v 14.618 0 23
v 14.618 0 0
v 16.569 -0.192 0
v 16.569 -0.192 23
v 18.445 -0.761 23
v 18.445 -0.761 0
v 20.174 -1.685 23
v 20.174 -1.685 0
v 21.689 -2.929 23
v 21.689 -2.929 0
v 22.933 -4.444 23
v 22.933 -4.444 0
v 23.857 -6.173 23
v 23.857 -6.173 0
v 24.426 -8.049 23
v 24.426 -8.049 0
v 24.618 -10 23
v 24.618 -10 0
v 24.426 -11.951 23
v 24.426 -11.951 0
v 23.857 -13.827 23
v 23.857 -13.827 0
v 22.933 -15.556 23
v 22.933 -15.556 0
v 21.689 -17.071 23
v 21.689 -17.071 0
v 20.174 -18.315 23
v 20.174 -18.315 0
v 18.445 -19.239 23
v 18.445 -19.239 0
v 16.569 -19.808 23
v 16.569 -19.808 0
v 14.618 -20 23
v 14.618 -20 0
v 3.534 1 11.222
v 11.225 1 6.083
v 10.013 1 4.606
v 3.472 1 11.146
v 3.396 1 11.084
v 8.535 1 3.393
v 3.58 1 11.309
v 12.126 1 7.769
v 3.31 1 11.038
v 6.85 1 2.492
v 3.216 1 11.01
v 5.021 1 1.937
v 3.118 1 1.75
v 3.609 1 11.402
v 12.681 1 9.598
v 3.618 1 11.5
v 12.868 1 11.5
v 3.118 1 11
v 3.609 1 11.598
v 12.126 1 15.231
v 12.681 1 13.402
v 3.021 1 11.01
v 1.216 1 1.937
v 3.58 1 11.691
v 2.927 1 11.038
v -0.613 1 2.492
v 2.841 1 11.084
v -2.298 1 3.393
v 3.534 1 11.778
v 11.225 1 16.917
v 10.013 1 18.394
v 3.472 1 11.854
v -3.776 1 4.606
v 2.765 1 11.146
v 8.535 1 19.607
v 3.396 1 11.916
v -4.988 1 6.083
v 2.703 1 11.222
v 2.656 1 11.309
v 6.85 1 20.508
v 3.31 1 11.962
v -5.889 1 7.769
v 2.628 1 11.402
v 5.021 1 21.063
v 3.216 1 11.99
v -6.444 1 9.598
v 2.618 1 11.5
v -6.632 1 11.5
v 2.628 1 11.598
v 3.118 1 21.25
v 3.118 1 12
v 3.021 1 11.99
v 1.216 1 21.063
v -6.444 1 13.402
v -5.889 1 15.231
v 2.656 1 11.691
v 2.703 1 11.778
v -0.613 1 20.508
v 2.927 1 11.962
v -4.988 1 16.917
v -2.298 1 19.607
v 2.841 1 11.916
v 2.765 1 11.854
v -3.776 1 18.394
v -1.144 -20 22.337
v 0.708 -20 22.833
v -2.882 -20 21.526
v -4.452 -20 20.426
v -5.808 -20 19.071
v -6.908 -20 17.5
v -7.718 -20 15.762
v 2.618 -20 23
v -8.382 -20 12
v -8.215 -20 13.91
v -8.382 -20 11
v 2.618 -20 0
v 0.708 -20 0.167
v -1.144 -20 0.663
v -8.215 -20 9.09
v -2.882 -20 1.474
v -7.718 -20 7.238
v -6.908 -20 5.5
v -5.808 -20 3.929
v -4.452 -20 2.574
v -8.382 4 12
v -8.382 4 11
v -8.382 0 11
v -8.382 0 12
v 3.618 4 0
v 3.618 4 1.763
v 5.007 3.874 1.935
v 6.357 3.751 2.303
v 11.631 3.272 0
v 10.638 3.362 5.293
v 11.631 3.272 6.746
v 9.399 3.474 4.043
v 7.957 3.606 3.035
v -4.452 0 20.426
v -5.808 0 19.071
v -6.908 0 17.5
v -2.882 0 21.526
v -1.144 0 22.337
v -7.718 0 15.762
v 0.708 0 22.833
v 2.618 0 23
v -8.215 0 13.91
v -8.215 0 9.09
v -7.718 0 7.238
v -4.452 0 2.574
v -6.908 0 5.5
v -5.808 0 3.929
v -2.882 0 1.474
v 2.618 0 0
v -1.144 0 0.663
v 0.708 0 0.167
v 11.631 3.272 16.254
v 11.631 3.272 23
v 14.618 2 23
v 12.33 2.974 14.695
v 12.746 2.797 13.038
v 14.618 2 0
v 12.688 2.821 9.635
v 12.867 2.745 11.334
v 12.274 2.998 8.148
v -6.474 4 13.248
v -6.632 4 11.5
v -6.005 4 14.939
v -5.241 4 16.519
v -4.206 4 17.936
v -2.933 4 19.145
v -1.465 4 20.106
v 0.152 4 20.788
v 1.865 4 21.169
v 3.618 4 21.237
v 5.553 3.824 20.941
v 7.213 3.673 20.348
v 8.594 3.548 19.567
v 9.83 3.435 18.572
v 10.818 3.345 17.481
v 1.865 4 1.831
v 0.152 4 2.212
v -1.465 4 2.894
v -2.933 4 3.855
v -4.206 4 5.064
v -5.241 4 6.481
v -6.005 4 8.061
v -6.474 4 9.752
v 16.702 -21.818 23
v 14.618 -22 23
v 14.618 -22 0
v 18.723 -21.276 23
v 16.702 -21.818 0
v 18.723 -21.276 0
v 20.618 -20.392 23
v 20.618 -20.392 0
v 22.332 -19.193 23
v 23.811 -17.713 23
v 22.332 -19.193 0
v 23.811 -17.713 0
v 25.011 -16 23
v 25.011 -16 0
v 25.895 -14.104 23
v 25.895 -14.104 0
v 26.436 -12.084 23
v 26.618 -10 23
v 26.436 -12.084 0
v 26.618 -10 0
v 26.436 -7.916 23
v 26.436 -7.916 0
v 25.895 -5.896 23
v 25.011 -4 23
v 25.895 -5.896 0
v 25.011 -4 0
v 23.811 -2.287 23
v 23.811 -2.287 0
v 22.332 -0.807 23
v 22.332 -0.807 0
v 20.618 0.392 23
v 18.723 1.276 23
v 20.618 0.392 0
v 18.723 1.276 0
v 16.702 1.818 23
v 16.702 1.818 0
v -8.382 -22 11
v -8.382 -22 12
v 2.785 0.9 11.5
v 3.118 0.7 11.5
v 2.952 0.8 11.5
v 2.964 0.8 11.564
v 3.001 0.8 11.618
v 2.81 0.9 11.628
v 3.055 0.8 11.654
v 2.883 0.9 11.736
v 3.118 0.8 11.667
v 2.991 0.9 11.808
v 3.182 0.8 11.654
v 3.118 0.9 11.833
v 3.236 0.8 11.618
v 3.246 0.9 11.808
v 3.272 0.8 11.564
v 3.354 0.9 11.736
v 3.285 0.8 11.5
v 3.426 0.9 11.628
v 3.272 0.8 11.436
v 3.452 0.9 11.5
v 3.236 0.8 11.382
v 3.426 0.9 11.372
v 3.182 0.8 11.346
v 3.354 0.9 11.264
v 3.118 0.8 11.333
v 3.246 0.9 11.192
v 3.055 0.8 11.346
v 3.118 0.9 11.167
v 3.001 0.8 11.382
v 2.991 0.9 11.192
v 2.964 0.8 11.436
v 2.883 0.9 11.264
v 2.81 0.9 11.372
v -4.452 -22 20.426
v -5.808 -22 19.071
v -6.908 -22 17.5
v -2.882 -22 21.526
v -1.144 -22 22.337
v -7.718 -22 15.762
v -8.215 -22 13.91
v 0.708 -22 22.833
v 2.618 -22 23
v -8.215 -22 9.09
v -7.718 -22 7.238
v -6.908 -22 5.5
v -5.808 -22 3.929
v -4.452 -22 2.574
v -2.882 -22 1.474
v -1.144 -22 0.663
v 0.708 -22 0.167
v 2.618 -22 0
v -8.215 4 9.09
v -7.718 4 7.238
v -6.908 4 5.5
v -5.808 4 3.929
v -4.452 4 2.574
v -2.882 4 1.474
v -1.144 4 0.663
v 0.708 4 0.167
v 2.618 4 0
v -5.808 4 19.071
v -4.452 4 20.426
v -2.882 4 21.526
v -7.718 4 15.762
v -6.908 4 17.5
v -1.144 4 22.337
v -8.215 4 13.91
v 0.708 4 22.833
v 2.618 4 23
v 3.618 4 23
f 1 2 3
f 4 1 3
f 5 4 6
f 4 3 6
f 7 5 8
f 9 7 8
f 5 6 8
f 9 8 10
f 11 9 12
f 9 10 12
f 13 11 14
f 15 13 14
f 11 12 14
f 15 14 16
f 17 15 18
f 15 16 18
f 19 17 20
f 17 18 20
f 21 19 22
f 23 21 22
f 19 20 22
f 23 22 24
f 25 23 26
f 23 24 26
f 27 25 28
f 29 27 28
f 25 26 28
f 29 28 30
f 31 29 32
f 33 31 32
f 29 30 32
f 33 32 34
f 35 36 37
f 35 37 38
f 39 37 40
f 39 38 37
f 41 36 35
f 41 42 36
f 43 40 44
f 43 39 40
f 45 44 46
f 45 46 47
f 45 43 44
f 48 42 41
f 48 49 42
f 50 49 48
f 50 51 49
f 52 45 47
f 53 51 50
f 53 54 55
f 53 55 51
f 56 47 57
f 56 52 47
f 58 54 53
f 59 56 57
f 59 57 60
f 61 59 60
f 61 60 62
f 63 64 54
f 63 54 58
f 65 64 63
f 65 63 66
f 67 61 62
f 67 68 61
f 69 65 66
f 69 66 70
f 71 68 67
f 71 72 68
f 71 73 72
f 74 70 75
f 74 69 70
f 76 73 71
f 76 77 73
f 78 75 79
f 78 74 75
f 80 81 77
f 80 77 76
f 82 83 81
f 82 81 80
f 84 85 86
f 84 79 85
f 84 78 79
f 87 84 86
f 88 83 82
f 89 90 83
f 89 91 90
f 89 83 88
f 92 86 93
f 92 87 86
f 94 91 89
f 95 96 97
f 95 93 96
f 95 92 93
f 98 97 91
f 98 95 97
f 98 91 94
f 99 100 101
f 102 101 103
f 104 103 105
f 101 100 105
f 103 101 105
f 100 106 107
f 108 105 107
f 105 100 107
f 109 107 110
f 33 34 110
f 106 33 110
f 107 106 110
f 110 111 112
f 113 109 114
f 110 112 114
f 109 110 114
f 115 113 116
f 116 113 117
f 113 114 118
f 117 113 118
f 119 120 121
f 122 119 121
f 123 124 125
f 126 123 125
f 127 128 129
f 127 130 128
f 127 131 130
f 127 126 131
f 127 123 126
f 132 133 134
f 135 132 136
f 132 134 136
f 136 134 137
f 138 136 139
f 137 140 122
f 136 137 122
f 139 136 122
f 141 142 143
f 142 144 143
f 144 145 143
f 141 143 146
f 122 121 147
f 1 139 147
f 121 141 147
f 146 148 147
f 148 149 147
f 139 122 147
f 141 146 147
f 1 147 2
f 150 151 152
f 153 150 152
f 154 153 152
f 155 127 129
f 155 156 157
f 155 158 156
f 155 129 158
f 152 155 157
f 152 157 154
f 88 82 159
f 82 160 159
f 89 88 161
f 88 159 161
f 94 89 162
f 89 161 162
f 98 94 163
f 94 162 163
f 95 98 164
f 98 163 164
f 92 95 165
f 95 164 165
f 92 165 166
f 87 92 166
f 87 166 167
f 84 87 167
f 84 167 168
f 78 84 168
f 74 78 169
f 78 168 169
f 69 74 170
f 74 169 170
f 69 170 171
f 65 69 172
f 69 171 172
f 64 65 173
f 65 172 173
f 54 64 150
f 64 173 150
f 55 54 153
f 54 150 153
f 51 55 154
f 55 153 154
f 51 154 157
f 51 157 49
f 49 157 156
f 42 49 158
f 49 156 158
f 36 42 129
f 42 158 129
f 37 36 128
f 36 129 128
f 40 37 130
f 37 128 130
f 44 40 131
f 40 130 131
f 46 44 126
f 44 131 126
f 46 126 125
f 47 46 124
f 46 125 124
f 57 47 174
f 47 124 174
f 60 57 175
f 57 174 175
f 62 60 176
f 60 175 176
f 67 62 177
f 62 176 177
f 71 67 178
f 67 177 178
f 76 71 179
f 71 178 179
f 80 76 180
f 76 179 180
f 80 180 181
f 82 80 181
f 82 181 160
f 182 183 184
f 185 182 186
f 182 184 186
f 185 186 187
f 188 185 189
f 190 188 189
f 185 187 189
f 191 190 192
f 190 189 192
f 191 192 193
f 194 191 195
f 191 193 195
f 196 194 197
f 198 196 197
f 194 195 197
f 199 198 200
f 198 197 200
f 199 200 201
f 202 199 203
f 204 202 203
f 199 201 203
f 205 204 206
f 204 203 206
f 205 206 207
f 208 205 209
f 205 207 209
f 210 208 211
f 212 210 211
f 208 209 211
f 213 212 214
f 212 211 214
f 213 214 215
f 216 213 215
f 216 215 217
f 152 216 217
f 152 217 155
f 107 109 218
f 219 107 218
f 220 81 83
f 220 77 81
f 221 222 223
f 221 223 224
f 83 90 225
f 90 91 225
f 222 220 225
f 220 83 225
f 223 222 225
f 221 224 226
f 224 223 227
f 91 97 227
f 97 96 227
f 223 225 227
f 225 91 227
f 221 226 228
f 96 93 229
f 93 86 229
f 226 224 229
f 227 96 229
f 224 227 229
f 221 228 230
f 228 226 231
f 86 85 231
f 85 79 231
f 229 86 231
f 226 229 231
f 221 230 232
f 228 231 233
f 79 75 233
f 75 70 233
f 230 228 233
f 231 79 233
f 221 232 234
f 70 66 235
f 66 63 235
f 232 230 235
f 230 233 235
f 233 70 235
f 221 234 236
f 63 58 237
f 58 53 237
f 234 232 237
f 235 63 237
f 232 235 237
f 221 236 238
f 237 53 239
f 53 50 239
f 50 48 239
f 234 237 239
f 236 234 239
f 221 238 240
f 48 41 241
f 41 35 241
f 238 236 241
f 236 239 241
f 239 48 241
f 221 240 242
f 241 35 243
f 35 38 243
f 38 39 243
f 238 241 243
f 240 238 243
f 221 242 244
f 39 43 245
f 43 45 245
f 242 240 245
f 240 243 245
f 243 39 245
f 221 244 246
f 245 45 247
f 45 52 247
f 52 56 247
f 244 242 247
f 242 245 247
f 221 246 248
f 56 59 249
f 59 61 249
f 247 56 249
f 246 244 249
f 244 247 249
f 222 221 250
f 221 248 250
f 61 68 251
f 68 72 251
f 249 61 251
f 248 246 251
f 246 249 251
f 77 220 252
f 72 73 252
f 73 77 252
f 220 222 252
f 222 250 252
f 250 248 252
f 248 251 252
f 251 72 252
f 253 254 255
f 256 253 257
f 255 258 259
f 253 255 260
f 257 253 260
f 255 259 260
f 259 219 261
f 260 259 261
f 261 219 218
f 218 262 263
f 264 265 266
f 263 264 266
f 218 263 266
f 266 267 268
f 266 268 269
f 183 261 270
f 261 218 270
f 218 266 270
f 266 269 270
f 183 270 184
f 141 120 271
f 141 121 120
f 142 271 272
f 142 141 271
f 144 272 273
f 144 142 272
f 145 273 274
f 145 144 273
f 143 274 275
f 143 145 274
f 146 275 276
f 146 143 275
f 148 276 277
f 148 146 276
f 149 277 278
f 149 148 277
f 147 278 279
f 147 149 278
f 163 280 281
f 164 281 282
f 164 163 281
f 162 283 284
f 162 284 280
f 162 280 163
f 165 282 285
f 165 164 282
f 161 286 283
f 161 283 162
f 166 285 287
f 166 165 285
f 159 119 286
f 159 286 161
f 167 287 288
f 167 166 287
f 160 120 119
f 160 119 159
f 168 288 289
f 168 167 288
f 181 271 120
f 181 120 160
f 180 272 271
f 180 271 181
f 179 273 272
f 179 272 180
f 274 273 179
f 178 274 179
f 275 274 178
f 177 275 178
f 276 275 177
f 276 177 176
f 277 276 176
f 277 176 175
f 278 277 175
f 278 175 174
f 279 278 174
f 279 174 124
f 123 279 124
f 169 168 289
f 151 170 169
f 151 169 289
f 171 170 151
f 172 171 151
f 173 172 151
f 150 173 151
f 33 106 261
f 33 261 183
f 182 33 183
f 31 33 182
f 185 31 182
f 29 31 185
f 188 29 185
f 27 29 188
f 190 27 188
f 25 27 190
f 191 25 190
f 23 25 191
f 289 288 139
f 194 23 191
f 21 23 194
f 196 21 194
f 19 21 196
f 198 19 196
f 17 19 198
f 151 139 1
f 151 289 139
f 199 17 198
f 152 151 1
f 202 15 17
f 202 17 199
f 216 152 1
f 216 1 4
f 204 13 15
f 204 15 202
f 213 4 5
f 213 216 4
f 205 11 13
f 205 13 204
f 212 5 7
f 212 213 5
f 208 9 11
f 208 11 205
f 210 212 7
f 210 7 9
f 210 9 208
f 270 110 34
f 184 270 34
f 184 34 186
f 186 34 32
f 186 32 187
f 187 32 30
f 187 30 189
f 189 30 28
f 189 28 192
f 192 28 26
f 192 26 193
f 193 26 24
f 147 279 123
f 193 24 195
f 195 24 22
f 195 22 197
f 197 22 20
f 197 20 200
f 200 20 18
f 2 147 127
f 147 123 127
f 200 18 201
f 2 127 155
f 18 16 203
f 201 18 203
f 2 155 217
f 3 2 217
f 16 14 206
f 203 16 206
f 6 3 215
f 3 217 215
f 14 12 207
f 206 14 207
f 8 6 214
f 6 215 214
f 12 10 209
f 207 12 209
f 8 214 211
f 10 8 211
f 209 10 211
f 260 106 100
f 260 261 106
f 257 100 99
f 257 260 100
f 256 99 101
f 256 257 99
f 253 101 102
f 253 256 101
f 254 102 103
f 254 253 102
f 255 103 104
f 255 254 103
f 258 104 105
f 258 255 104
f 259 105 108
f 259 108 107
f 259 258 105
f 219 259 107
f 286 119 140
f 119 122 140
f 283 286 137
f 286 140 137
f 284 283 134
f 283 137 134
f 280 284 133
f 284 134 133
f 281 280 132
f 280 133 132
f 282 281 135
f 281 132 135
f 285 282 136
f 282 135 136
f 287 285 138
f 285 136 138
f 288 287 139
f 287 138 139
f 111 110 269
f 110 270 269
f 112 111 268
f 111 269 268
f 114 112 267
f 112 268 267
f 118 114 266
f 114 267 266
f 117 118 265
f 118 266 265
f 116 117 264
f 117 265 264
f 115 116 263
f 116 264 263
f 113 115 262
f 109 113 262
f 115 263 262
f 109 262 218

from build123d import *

# Parameters (mm, degrees)
F0_W           = 23
F0_H           = 2
F1_DEPTH       = 23
F3_D           = 1
F3_DEPTH       = 3
F3_CBORE_D     = 19.5
F3_CBORE_DEPTH = 3
F3_TIP         = 0.3004303095
F4_R           = 11
F5_T1_DEPTH    = 80.1913118923
F6_T4_DEPTH    = 38.5721694425
F6_S5_R        = 12
F6_T6_DEPTH    = 21


# Not quite as in the source:
# - a fillet or chamfer that OpenCascade refuses, or shapes differently, is made with other operations: its cross-section is extruded or revolved along the edge and cut away or added


with BuildPart() as f1:
    # F0 (on Top) → F1 (new body)
    with BuildSketch(Plane.XY):
        with BuildLine():
            Line((-8.3816226795, 2), (-8.3816226795, 0))
            Line((-8.3816226795, 0), (14.6183773205, 0))
            ThreePointArc((14.6183773205, 0), (24.6183773205, -10), (14.6183773205, -20))
            Line((14.6183773205, -20), (-8.3816226795, -20))
            Line((-8.3816226795, -20), (-8.3816226795, -22))
            Line((-8.3816226795, -22), (14.6183773205, -22))
            ThreePointArc((14.6183773205, -22), (26.6183773205, -10), (14.6183773205, 2))
            Line((14.6183773205, 2), (-8.3816226795, 2))
        make_face()
        with Locations((3.1183773205, 3)):
            Rectangle(F0_W, F0_H)
    extrude(amount=F1_DEPTH)

    # F3
    with Locations(Plane(origin=(0, 4, 0), x_dir=(-1, 0, 0), z_dir=(0, 1, 0))):
        with Locations((-3.1183773205, 11.5)):
            CounterBoreHole(F3_D / 2, F3_CBORE_D / 2, F3_CBORE_DEPTH, depth=F3_DEPTH)
            with Locations((0, 0, -(F3_DEPTH + F3_TIP / 2))):  # 118° drill point
                Cone(0, F3_D / 2, F3_TIP, mode=Mode.SUBTRACT)

    # F4
    f4_edges = [f1.edges().sort_by_distance(p)[0] for p in [
        (-8.381623, 2, 23),
        (-8.381623, 2, 0),
        (-8.381623, -21, 0),
        (-8.381623, -21, 23),
    ]]
    fillet(f4_edges, radius=F4_R)

    # F5: chamfer of 11 x 1 on 1 edges, made by hand

    # F5_s2 → F5_t1 (cut)
    with BuildSketch(Plane.XY.offset(-28.5956559462)):
        Polygon((3.6183773205, 4), (14.6183773205, 3), (14.6183773205, 4), align=None)
    extrude(amount=F5_T1_DEPTH, mode=Mode.SUBTRACT)

    # F6: chamfer of 1 x 3 on 1 edges, made by hand


with BuildPart() as f6_tool2:
    # F6_s3 → F6_t4 (new body)
    with BuildSketch(Plane.XY.offset(-7.7860847213)):
        Polygon((11.6306977011, 3.2716072381), (14.6183773205, 2), (14.6183773205, 3), align=None)
    extrude(amount=F6_T4_DEPTH)

    # F6_s5 → F6_t6 (cut, symmetric)
    with BuildSketch(Plane.XY.offset(11.5)):
        with Locations((14.6183773205, -10)):
            Circle(F6_S5_R)
    extrude(amount=F6_T6_DEPTH, both=True, mode=Mode.SUBTRACT)


with BuildPart() as f1_1:
    add(f1.part)

    # F6_t1: cut F6_tool2
    add(f6_tool2.part, mode=Mode.SUBTRACT)


solid = f1_1.part
